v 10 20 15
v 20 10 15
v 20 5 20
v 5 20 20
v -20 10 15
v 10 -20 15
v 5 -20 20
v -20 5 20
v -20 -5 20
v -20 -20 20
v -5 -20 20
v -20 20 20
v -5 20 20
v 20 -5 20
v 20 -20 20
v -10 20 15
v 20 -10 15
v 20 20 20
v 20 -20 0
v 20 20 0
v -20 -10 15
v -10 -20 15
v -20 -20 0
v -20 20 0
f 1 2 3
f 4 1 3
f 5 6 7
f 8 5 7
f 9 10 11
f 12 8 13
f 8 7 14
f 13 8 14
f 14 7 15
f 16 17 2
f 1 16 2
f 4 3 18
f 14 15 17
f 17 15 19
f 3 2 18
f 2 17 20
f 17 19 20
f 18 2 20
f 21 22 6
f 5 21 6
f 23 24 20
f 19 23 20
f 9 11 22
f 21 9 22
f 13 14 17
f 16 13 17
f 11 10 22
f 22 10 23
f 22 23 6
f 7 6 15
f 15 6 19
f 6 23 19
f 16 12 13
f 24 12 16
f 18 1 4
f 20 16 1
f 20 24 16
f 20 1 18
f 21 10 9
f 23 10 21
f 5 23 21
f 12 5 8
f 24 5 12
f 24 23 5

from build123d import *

# Parameters (mm, degrees)
F0_W     = 40
F0_H     = 40
F1_DEPTH = 40
F4_DEPTH = 30


with BuildPart() as f1:
    # F0 (on Top) → F1 (new body)
    with BuildSketch(Plane.XY):
        Rectangle(F0_W, F0_H)
    extrude(amount=F1_DEPTH)

    # F3 (on 3pt) → F4 (cut, symmetric)
    with BuildSketch(Plane(origin=(0, 0, 0), x_dir=(0.7071067812, 0.7071067812, 0), z_dir=(0.7071067812, -0.7071067812, 0))):
        Polygon((-28.2842712475, 40), (-28.2842712475, 20), (-17.6776695297, 20), (-21.2132034356, 15), (-7.0710678119, 15), (-10.6066017178, 20), (10.6066017178, 20), (7.0710678119, 15), (21.2132034356, 15), (17.6776695297, 20), (28.2842712475, 20), (28.2842712475, 40), align=None)
    extrude(amount=F4_DEPTH, both=True, mode=Mode.SUBTRACT)


solid = f1.part
